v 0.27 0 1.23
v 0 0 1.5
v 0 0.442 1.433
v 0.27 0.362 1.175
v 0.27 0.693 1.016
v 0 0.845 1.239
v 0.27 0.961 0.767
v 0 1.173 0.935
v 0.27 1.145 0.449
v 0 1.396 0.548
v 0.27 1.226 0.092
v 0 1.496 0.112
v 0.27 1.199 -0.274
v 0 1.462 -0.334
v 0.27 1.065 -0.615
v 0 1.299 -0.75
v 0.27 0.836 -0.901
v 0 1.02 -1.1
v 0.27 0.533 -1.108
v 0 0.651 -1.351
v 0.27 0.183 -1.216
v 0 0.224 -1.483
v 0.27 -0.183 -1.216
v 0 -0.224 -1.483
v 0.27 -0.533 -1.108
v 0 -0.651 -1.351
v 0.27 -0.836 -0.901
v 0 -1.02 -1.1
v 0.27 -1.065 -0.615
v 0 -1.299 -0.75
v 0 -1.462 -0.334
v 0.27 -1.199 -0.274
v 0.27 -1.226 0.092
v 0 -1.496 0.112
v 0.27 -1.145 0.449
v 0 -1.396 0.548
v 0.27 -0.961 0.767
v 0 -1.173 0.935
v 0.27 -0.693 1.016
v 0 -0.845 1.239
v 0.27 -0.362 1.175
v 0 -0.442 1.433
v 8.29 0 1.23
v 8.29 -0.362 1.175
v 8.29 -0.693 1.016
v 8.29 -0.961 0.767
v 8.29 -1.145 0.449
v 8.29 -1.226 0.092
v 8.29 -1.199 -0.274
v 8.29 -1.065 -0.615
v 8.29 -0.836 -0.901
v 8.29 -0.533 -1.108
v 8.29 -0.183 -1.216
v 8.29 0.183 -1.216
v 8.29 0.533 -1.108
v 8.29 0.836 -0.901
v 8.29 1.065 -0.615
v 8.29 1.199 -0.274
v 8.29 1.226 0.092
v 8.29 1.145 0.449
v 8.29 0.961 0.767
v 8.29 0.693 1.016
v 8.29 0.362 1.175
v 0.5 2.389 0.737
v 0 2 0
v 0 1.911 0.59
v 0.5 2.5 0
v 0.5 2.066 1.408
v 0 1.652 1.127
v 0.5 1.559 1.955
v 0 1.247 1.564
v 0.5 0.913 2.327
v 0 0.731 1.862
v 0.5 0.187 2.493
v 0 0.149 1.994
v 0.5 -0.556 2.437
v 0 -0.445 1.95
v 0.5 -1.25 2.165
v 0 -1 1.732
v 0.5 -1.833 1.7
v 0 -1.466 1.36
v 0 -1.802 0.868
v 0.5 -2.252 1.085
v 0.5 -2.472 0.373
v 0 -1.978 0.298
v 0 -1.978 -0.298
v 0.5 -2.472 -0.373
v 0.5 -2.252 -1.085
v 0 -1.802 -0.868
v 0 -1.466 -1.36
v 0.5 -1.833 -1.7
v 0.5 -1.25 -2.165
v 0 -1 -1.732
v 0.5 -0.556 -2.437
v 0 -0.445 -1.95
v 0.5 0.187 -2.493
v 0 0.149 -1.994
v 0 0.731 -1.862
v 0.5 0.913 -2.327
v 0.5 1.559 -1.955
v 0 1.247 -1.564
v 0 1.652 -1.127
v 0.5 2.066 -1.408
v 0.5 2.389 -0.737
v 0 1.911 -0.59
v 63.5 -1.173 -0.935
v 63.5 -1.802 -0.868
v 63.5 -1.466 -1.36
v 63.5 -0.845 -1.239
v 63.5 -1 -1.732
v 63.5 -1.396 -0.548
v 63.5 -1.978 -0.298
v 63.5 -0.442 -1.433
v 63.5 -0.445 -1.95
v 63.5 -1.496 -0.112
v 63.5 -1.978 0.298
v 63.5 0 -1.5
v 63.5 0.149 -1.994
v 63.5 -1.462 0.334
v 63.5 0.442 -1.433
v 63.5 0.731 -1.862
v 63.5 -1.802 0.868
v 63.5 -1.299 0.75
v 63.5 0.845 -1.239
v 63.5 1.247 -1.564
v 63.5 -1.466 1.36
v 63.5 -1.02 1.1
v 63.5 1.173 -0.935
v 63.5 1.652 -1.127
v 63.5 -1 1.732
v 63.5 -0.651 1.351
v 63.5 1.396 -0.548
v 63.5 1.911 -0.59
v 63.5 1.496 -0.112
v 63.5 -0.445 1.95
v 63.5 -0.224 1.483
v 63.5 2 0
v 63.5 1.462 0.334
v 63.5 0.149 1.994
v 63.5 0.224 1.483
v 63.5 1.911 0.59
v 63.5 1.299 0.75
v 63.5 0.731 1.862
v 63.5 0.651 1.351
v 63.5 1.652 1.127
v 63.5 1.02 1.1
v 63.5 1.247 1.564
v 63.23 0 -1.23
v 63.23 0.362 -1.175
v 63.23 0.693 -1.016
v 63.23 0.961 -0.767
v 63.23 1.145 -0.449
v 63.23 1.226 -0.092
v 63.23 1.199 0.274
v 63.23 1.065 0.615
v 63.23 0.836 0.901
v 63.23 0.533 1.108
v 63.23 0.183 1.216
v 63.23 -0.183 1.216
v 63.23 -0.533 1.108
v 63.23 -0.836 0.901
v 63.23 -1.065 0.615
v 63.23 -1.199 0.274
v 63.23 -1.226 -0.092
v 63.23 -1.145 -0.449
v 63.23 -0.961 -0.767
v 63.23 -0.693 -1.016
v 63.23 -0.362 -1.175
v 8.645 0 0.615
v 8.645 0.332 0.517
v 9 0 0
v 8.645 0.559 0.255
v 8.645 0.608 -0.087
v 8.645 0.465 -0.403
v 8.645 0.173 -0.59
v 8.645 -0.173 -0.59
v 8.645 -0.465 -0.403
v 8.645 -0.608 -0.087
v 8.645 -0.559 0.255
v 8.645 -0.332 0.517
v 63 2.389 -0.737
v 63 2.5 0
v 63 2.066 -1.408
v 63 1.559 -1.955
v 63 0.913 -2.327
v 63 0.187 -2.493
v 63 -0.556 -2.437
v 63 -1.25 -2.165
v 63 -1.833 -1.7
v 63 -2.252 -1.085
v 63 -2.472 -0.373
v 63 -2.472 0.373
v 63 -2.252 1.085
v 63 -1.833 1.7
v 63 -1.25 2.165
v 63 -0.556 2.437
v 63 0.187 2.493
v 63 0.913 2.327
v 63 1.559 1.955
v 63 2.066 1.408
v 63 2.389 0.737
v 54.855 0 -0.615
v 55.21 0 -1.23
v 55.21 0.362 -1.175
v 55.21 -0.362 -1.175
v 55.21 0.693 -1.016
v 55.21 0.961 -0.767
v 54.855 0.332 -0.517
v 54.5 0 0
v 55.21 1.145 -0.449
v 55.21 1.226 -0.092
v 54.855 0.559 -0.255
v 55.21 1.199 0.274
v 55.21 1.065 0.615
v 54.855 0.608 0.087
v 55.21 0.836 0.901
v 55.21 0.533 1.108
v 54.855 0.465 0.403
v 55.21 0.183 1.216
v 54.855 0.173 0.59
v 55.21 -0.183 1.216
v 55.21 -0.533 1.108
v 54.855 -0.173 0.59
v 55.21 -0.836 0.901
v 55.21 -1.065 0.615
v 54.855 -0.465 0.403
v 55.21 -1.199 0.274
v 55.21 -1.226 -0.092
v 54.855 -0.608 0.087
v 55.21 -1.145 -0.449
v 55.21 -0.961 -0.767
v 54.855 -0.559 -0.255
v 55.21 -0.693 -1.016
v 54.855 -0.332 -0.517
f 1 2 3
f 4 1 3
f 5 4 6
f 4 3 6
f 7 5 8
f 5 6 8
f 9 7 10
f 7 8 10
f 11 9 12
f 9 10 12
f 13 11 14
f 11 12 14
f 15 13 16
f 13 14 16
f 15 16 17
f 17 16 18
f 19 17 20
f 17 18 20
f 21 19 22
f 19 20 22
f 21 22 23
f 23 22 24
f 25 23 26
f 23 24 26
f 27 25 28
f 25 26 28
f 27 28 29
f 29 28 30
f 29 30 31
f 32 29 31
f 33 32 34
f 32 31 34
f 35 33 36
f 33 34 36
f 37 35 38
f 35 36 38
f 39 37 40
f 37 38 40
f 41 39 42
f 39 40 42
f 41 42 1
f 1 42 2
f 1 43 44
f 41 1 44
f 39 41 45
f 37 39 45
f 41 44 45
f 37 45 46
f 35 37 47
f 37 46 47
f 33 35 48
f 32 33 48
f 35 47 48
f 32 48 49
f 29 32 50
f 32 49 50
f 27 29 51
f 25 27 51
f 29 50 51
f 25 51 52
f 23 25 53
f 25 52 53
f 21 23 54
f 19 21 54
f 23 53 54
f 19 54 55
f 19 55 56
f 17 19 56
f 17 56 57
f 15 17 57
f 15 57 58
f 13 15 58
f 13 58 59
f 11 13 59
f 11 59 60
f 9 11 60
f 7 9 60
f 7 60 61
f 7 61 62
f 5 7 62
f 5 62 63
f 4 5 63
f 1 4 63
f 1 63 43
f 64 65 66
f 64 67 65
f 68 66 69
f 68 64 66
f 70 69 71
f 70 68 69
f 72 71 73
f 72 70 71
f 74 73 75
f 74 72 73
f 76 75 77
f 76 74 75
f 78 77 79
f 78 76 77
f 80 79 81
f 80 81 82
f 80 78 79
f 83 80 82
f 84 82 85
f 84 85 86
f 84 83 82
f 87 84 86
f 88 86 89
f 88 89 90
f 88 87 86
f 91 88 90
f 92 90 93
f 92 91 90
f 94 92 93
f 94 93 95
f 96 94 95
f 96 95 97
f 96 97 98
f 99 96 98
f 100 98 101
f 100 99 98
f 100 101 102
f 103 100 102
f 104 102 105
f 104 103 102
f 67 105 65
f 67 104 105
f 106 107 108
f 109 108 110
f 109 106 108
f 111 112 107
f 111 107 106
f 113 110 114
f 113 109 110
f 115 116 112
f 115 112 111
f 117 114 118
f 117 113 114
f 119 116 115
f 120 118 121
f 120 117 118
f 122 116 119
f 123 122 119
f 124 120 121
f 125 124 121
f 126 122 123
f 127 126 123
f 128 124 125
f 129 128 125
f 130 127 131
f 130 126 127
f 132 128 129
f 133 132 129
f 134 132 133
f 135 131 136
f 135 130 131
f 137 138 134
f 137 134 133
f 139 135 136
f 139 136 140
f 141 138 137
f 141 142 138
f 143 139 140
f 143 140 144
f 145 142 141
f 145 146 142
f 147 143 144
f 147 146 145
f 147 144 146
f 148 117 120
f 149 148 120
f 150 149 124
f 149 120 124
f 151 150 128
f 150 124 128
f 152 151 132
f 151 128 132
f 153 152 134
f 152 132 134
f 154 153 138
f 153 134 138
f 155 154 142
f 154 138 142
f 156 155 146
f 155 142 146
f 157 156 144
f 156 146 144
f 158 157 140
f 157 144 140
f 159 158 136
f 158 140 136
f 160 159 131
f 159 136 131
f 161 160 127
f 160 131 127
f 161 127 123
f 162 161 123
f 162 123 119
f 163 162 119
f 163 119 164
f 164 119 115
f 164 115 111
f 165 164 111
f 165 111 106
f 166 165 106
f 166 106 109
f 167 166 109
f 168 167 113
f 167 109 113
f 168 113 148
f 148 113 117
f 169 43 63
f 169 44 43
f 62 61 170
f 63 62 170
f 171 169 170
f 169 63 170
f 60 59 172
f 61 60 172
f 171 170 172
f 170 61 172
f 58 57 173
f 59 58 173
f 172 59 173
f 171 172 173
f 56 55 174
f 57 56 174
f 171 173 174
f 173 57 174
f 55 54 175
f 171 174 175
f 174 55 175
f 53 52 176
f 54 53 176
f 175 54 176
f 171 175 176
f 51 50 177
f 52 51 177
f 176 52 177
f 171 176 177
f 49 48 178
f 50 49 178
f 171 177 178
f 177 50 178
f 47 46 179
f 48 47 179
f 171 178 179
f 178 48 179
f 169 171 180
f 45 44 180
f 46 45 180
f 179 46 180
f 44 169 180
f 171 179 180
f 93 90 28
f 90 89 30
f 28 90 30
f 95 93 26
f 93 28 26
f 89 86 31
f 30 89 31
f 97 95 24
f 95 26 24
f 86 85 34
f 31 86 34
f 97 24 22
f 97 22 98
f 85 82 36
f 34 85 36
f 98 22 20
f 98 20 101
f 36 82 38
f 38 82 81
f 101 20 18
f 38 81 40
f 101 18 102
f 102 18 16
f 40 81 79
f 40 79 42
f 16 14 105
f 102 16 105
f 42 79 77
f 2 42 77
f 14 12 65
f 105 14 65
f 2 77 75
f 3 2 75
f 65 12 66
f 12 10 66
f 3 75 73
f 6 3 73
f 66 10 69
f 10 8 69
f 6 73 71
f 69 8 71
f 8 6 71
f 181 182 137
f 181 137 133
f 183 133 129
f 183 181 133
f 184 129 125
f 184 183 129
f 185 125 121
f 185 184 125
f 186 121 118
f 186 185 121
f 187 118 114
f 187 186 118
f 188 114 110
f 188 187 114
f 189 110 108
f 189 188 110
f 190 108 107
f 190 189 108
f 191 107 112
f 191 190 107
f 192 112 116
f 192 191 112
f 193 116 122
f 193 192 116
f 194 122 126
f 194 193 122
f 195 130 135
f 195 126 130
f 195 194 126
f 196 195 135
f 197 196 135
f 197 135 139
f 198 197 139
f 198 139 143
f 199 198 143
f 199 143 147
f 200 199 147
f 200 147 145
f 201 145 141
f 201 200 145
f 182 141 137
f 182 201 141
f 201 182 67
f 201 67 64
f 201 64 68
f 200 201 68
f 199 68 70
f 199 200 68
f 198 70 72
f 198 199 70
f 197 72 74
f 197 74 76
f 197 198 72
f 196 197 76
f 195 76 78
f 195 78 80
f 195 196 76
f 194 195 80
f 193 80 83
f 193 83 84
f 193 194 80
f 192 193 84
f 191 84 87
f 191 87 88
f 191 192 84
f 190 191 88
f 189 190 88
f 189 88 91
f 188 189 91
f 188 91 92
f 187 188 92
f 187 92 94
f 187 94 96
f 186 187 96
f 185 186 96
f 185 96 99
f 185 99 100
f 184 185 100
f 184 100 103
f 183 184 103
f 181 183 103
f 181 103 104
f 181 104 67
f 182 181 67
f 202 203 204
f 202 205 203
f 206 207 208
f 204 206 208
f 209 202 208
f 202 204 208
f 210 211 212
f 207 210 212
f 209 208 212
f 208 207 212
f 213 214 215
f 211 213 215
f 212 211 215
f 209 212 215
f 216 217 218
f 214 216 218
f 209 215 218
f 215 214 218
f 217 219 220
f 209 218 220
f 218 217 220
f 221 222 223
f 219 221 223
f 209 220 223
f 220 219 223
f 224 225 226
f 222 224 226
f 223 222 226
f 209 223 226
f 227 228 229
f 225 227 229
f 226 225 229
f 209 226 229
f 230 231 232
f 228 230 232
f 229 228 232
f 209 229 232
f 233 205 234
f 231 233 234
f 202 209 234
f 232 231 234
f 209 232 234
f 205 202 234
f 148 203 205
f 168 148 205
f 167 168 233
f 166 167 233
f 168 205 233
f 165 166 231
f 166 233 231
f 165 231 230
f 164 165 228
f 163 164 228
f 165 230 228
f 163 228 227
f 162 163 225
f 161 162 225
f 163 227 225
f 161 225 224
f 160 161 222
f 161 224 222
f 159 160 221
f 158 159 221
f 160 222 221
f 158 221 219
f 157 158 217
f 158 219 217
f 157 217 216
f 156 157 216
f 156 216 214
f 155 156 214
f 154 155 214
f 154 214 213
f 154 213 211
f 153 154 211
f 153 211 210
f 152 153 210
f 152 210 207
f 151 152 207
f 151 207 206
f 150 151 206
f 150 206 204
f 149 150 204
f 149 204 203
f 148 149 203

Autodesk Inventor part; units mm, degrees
ref_plane "YZ Plane" through (0, 0, 0) normal (1, 0, 0) x (0, 1, 0)
ref_plane "XZ Plane" through (0, 0, 0) normal (0, 1, 0) x (-1, 0, 0)
ref_plane "XY Plane" through (0, 0, 0) normal (0, 0, 1) x (1, 0, 0)
sketch "Sketch_1" plane through (0, 0, 0) normal (0, 0, 1) x (1, 0, 0)
  line L0 (63.5, 0) -> (0, 0)
  line L1 (0, 0) -> (0, 2)
  line L2 (0, 2) -> (0.5, 2.5)
  line L3 (0.5, 2.5) -> (63, 2.5)
  line L4 (63, 2.5) -> (63.5, 2)
  line L5 (63.5, 2) -> (63.5, 0)
  line L6 (63.5, 0) -> (0, 0)
revolve "Revolution1" add sketch "Sketch_1" angle 360 about axis through (63.5, 0, 0) along (1, 0, 0)
sketch "Sketch2" plane through (0, 0, 0) normal (-1, 0, 0) x (0, 0, 1)
  point P0 (0, 0)
hole "Hole1" at (0, 0, 0) direction (1, 0, 0) diameter 2.459 depth 8.2901 tip angle 120 countersink diameter 3 countersink angle 90 thread size "M3x0.5" class "6H" standard "ISO Metric profile"
sketch "Sketch3" plane through (63.5, 0, 0) normal (1, 0, 0) x (0, 0, -1)
  point P0 (0, 0)
hole "Hole2" at (63.5, 0, 0) direction (-1, 0, 0) diameter 2.459 depth 8.2901 tip angle 120 countersink diameter 3 countersink angle 90 thread size "M3x0.5" class "6H" standard "ISO Metric profile"
properties part number "SETF5-63.5-M3-N3" material "ステンレス鋼 AISI 304"
